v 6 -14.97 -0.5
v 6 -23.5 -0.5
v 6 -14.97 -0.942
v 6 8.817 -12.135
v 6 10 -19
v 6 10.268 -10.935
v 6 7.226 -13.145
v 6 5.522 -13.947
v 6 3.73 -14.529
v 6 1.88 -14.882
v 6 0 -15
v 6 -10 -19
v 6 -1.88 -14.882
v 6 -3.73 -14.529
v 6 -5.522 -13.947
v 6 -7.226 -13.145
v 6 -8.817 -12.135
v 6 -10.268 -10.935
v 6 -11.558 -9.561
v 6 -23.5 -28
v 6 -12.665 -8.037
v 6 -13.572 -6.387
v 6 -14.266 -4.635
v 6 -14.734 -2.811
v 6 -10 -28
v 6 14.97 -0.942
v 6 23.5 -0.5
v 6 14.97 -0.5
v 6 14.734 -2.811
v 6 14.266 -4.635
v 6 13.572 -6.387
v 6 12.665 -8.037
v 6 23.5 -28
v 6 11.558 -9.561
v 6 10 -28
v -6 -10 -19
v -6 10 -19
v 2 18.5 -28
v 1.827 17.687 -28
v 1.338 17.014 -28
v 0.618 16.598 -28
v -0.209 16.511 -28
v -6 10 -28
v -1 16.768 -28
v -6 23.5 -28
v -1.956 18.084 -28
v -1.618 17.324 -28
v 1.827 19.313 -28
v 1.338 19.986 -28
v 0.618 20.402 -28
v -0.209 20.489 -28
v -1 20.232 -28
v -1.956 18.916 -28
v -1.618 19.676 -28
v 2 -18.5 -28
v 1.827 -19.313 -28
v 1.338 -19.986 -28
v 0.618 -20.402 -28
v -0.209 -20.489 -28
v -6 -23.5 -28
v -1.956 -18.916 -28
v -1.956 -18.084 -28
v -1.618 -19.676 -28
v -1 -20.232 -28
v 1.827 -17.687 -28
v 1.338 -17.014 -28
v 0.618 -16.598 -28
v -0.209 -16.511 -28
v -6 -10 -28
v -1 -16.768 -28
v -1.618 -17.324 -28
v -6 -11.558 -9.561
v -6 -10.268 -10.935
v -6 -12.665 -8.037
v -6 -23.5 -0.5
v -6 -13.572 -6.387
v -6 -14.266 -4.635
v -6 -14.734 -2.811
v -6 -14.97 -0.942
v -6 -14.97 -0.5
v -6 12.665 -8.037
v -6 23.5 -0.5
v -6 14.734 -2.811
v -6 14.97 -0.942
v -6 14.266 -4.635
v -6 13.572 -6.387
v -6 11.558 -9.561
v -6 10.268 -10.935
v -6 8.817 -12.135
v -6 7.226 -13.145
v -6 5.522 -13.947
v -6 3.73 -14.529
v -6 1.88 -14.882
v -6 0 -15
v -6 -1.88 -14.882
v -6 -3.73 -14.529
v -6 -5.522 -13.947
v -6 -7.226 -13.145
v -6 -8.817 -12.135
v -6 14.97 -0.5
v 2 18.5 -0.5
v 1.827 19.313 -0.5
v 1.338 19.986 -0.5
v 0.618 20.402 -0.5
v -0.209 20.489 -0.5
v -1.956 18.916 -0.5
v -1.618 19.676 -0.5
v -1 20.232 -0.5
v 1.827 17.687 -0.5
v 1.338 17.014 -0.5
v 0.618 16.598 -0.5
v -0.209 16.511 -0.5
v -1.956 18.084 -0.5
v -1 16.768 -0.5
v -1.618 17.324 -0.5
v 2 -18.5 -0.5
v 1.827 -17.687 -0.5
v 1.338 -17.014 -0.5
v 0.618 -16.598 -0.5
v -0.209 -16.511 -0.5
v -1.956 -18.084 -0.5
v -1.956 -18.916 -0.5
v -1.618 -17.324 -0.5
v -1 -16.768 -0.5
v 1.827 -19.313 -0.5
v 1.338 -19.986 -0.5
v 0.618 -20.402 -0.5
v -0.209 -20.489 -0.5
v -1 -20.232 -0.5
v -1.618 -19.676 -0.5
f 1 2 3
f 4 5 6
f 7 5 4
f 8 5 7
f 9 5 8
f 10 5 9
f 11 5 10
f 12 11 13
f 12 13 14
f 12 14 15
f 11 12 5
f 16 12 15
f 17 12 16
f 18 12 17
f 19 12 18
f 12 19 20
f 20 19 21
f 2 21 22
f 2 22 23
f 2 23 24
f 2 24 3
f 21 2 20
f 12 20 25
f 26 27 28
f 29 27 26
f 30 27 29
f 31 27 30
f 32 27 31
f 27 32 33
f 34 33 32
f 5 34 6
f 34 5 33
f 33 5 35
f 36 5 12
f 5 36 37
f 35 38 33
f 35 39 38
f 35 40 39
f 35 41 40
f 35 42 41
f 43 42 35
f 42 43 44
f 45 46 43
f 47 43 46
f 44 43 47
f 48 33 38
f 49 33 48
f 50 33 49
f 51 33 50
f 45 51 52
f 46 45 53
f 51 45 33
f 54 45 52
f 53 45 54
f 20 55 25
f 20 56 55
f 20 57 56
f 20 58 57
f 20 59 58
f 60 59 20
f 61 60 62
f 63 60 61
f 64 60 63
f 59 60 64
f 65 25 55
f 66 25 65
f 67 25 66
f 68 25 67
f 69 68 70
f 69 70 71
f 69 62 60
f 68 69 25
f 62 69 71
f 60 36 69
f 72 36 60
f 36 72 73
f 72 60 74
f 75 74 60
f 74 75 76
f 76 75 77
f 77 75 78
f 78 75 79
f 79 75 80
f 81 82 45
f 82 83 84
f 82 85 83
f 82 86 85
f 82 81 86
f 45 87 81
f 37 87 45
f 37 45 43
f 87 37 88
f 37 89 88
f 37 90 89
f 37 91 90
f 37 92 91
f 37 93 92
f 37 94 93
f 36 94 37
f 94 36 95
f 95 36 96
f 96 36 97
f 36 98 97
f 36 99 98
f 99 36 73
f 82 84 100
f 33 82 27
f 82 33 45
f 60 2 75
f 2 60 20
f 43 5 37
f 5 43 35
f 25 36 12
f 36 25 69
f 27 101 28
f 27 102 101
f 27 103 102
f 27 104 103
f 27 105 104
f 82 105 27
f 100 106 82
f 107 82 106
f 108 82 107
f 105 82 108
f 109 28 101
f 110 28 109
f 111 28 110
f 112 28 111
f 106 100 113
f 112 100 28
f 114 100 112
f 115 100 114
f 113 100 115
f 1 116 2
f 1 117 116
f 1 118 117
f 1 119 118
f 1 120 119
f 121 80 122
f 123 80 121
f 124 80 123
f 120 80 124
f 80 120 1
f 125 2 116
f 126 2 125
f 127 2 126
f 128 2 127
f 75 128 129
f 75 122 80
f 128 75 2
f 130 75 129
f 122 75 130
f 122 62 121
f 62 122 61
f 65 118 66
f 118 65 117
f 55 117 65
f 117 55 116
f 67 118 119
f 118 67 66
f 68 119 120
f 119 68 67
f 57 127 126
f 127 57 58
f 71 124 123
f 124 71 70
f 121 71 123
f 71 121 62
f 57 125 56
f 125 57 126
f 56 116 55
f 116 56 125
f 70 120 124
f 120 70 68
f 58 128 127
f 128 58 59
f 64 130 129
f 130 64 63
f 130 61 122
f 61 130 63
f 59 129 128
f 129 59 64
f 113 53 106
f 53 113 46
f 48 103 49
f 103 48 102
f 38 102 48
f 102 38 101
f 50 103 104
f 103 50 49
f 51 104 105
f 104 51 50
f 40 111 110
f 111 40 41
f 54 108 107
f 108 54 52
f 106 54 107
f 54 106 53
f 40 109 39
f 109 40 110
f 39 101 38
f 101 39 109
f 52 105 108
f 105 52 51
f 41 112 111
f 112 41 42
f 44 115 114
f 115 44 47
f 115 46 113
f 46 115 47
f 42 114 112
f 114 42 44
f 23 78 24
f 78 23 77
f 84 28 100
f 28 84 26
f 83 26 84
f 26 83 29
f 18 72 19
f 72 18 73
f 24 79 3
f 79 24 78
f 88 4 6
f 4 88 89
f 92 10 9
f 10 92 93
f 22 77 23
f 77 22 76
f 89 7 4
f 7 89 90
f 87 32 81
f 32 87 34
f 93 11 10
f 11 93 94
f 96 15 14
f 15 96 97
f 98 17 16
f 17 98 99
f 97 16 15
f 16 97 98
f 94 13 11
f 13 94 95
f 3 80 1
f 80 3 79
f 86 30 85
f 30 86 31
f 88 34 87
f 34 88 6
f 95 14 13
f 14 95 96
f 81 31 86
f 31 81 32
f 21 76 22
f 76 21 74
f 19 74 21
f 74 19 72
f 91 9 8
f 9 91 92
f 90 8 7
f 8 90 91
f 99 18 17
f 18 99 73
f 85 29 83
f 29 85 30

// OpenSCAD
// file: config.scad
// Author: Mihai Oltean, www.tcreate.org, mihai.oltean@gmail.com
// More details: jenny5.org
// Source: github.com/jenny5-robot
// MIT License
//--------------------------------------------------------------

aluminium_color = "Silver";
screw_color = "LightSlateGray";
frame_color = aluminium_color;
shaft_color = "Silver";
plastic_color = "Yellow";
pulley_color = "DarkSlateGray";
steel_color = "LightSlateGray";
// file: params_basic_components.scad
// Author: Mihai Oltean, https://mihaioltean.github.io, mihai.oltean@gmail.com
// More details: jenny5.org
// Source: github.com/jenny5-robot
// MIT License
//--------------------------------------------------------------

spring_length = 20;

smooth_rod_8_radius = 4;
smooth_rod_10_radius = 5;
smooth_rod_12_radius = 6;

wall_thick_1 = 1;
wall_thick_2 = 2;
wall_thick_3 = 3;
wall_thick_4 = 4;
wall_thick_5 = 5;
wall_thick_5_5 = 5.5;
wall_thick_6 = 6;
wall_thick_7 = 7;
wall_thick_8 = 8;
wall_thick_9 = 9;
wall_thick_10 = 10;
wall_thick_12 = 12;
// file: params_screws_nuts_washers.scad
// Author: Mihai Oltean, www.tcreate.org, mihai.oltean@gmail.com
// More details: jenny5.org
// Source: github.com/jenny5-robot
// MIT License
//--------------------------------------------------------------


m2_screw_radius = 1;
m2_nut_radius = 2.2;
m2_nut_height = 1.6;
m2_nut_thick = m2_nut_height;

m3_screw_radius = 1.5;
m3_nut_radius = 3.1;
m3_nut_height = 2.3;
m3_nut_thick = m3_nut_height;
m3_autolock_nut_thick = 4.2;

m4_screw_radius = 2;
m4_nut_radius = 4;
m4_auto_lock_nut_height = 5;
m4_nut_height = 3.25;
m4_nut_thick = 3.25;

m5_screw_radius = 2.5;
m5_nut_radius = 4.6;
m5_nut_height = 4;

m6_screw_radius = 3;
m6_nut_radius = 5.65;
m6_nut_thick = 5;
m6_nut_slim_thick = 3;
m6_autolock_nut_thick = 6;
m6_long_nut_thick = 9;

m8_screw_head_height = 5.7;
m8_screw_radius = 3.9;
m8_nut_small_width = 12.8;
m8_nut_radius = 7.3;
m8_slim_nut_small_width = 12.4;
m8_nut_thick = 6.5;
m8_nut_height = m8_nut_thick;
m8_slim_nut_height = 5.5;
m8_screw_head_radius = 6.5;
m8_autolock_nut_thick = 8;

m10_screw_radius = 5;
m10_nut_thick = 8;
m10_nut_radius = 9.8;

M12_screw_radius = 6;
M12_nut_thick = 10;
M12_nut_radius = 11;
M12_long_long_nut_thick = 36;
M12_long_nut_thick = 36;
M12_autolock_nut_thick = 14;

m10_long_nut_radius = 9.71;
m10_long_nut_height = 29.8;

m10_long_thick_nut_radius = 7.41;
m10_long_thick_nut_height = 30.4;

m12_plastic_nut_radius = 10.45;
m12_plastic_nut_height = 23.3;

tr12_3_nut_radius = 11;
tr12_3_nut_height = 18.1;

washer_5 = 0.97;

washer_4_12_radius = 6;
washer_4_12_external_radius = 6;
washer_4_12_thick = 1;
washer_4_thick = 1;
washer_4_12_internal_radius = 2.15;

washer_4_9_external_radius = 4.5;
washer_4_9_internal_radius = 2.15;
washer_4_9_thick = 1;

washer_6_thick = 1.7;
washer_8_thick = 1.5;
washer_5_thick = 1;

washer_10_height = 2;
washer_10_thick = 2;

washer_12_thick = 2;

washer_5_15_external_radius = 7.5;
washer_5_15_thick = 1;
washer_5_thick = 1;
washer_5_15_internal_radius = 2.65;
// file: tolerance.scad
// Author: Mihai Oltean, https://mihaioltean.github.io, mihai.oltean@gmail.com
// More details: jenny5.org
// Source: github.com/jenny5-robot
// MIT License
//--------------------------------------------------------------

tolerance = 0.1;
display_tolerance = 1;

overlap_tolerance = 0.01;

tolerance_z = [0, 0, tolerance];
tolerance_x = [tolerance, 0, 0];
tolerance_y = [0, tolerance, 0];

display_tolerance_z = [0, 0, display_tolerance];
display_tolerance_x = [display_tolerance, 0, 0];
display_tolerance_y = [0, display_tolerance, 0];

display_tolerance_xz = [display_tolerance, 0, display_tolerance];
display_tolerance_xy = [display_tolerance, display_tolerance, 0];
display_tolerance_yz = [0, display_tolerance, display_tolerance];

display_tolerance_xyz = [display_tolerance, display_tolerance, display_tolerance];
// file: params_tube_bracket.scad
// Author: Mihai Oltean, www.tcreate.org, mihai.oltean@gmail.com
// More details: jenny5.org
// Source: github.com/jenny5-robot
// MIT License
//--------------------------------------------------------------

include <params_screws_nuts_washers.scad>
include <params_basic_components.scad>
include <config.scad>


tube_bracket_base_thick = wall_thick_2;
tube_bracket_base_thick_strong = wall_thick_4;

braket_lateral_wall_thick = 2 * m4_screw_radius + wall_thick_3 + 1.5;

function f_bracket_width(tube_radius) = 2 * (tube_radius + braket_lateral_wall_thick);
function f_bracket_height(tube_radius) = tube_bracket_base_thick + 2 * tube_radius - 0.5;
function f_bracket_height_half(tube_radius) = tube_bracket_base_thick + tube_radius - 0.5;
function f_bracket_height_strong(tube_radius) = tube_bracket_base_thick_strong + 2 * tube_radius - 0.5;
function f_bracket_height_strong_half(tube_radius) = tube_bracket_base_thick_strong + tube_radius - 0.5;

function f_tube_bracket_holes(bracket_length, tube_radius) = [
    [5, wall_thick_3 + m4_screw_radius, 0],
    [5, f_bracket_width(tube_radius) - (wall_thick_3 + m4_screw_radius), 0],
    [bracket_length - 5, wall_thick_3 + m4_screw_radius, 0],
    [bracket_length - 5, f_bracket_width(tube_radius) - (wall_thick_3 + m4_screw_radius), 0],
];

function f_tube_bracket_single_hole(bracket_length, tube_radius) = [
    [bracket_length / 2, wall_thick_3 + m4_screw_radius, 0],
    [bracket_length / 2, f_bracket_width(tube_radius) - (wall_thick_3 + m4_screw_radius), 0]
];
// main file
// Author: Mihai Oltean, www.tcreate.org, mihai.oltean@gmail.com
// More details: jenny5.org
// Source: github.com/jenny5-robot
// MIT License
//--------------------------------------------------------------

include <params_tube_bracket.scad>
include <tolerance.scad>

//-------------------------------------------------------------------------
module tube_bracket_half(bracket_length, tube_radius)
{
    bracket_width = f_bracket_width(tube_radius);
    bracket_height = f_bracket_height(tube_radius);
    
    holes = f_tube_bracket_holes(bracket_length, tube_radius);

    difference(){
        union(){
            color(plastic_color) cube([bracket_length, bracket_width, bracket_height]);
        }
        // tube horizontal
        translate ([0, bracket_width / 2, tube_bracket_base_thick + tube_radius] - display_tolerance_x) rotate([0, 90, 0]) cylinder(h = bracket_length + 2 * display_tolerance, r = tube_radius, $fn = 50);
    
        for (i = [0 : 3])
            translate(holes[i] - display_tolerance_z) cylinder (h = bracket_height + 2 * display_tolerance, r = m4_screw_radius, $fn = 15);
    }
}
//-------------------------------------------------------------------------
module tube_bracket_long(bracket_length, tube_radius)
{
    bracket_width = f_bracket_width(tube_radius);
    bracket_height = f_bracket_height(tube_radius);
    
    holes = f_tube_bracket_holes(bracket_length, tube_radius);

    difference(){
        union(){
            color(plastic_color) cube([bracket_length, bracket_width, bracket_height]);
        }
        hull(){
        // tube horizontal
            translate ([0, bracket_width / 2, tube_bracket_base_thick + tube_radius] - display_tolerance_x) rotate([0, 90, 0]) cylinder(h = bracket_length + 2 * display_tolerance, r = tube_radius, $fn = 50);
            translate ([0, bracket_width / 2, tube_bracket_base_thick + 2 * tube_radius] - display_tolerance_x) rotate([0, 90, 0]) cylinder(h = bracket_length + 2 * display_tolerance, r = tube_radius, $fn = 50);
        }
        for (i = [0 : 3])
            translate(holes[i] - display_tolerance_z) cylinder (h = bracket_height + 2 * display_tolerance, r = m4_screw_radius, $fn = 15);
    }
}
//-------------------------------------------------------------------------
module tube_bracket_long_one_hole(bracket_thick, tube_radius, half = false, extra_height = 0, hole_y = 20, hole_z = 0)
{
    bracket_width = f_bracket_width(tube_radius);
    bracket_height = 0;
    holes = f_tube_bracket_single_hole(bracket_thick, tube_radius);

    translate([-bracket_thick / 2, -bracket_width / 2, -tube_radius - tube_bracket_base_thick_strong])
    if (half){
        bracket_height = f_bracket_height_strong_half(tube_radius);
    difference(){
        union(){
            color(plastic_color) cube([bracket_thick, bracket_width, bracket_height]);
            translate ([0, 0, -extra_height]) 
            difference() {
                cube([bracket_thick, bracket_width, extra_height]);
                translate ([0, bracket_width / 2 - hole_y / 2, 0]) cube([bracket_thick, hole_y, hole_z]);
            }
        }
        hull(){
        // tube horizontal
            translate ([0, bracket_width / 2, tube_bracket_base_thick_strong + tube_radius] - display_tolerance_x) rotate([0, 90, 0]) cylinder(h = bracket_thick + 2 * display_tolerance, r = tube_radius, $fn = 50);
            translate ([0, bracket_width / 2, tube_bracket_base_thick_strong + 2 * tube_radius] - display_tolerance_x) rotate([0, 90, 0]) cylinder(h = bracket_thick + 2 * display_tolerance, r = tube_radius, $fn = 50);
        }
        
        // screw holes
        for (i = [0 : 1])
            translate(holes[i] - [0, 0, extra_height] - display_tolerance_z) cylinder (h = bracket_height + extra_height + 2 * display_tolerance, r = m4_screw_radius, $fn = 15);
    }
    }
    else{
        bracket_height = f_bracket_height_strong(tube_radius);
    

    difference(){
        union(){
            color(plastic_color) cube([bracket_thick, bracket_width, bracket_height]);
        }
        hull(){
        // tube horizontal
            translate ([0, bracket_width / 2, tube_bracket_base_thick_strong + tube_radius] - display_tolerance_x) rotate([0, 90, 0]) cylinder(h = bracket_thick + 2 * display_tolerance, r = tube_radius, $fn = 50);
            translate ([0, bracket_width / 2, tube_bracket_base_thick_strong + 2 * tube_radius] - display_tolerance_x) rotate([0, 90, 0]) cylinder(h = bracket_thick + 2 * display_tolerance, r = tube_radius, $fn = 50);
        }
        
        //screw holes
        
        for (i = [0 : 1])
            translate(holes[i] - [0, 0, extra_height] - display_tolerance_z ) cylinder (h = bracket_height + extra_height + 2 * display_tolerance, r = m4_screw_radius, $fn = 15);
        
    }
}
}
//-------------------------------------------------------------------------
module tube_bracket_long_strong(bracket_length, tube_radius)
{
    bracket_width = f_bracket_width(tube_radius);
    bracket_height = f_bracket_height_strong(tube_radius);
    
    holes = f_tube_bracket_holes(bracket_length, tube_radius);

    difference(){
        union(){
            color(plastic_color) cube([bracket_length, bracket_width, bracket_height]);
        }
        hull(){
        // tube horizontal
            translate ([0, bracket_width / 2, tube_bracket_base_thick_strong + tube_radius] - display_tolerance_x) rotate([0, 90, 0]) cylinder(h = bracket_length + 2 * display_tolerance, r = tube_radius, $fn = 50);
            translate ([0, bracket_width / 2, tube_bracket_base_thick_strong + 2 * tube_radius] - display_tolerance_x) rotate([0, 90, 0]) cylinder(h = bracket_length + 2 * display_tolerance, r = tube_radius, $fn = 50);
        }
        for (i = [0 : 3])
            translate(holes[i] - display_tolerance_z) cylinder (h = bracket_height + 2 * display_tolerance, r = m4_screw_radius, $fn = 15);
    }
}
//-------------------------------------------------------------------------
//tube_bracket_half(40, 12.5);
//tube_bracket_long(40, 12.5);

//tube_bracket_long_strong(bracket_length = 12, tube_radius = 12.5);

//tube_bracket_long_one_hole(bracket_thick = 12, tube_radius = 12.5, half = true);

//tube_bracket_long_one_hole(bracket_thick = 12, tube_radius = 12.5, half = true, extra_height = 9, hole_y = 20, hole_z = 9);

tube_bracket_long_one_hole(bracket_thick = 12, tube_radius = 15, half = true, extra_height = 9, hole_y = 20, hole_z = 9);
